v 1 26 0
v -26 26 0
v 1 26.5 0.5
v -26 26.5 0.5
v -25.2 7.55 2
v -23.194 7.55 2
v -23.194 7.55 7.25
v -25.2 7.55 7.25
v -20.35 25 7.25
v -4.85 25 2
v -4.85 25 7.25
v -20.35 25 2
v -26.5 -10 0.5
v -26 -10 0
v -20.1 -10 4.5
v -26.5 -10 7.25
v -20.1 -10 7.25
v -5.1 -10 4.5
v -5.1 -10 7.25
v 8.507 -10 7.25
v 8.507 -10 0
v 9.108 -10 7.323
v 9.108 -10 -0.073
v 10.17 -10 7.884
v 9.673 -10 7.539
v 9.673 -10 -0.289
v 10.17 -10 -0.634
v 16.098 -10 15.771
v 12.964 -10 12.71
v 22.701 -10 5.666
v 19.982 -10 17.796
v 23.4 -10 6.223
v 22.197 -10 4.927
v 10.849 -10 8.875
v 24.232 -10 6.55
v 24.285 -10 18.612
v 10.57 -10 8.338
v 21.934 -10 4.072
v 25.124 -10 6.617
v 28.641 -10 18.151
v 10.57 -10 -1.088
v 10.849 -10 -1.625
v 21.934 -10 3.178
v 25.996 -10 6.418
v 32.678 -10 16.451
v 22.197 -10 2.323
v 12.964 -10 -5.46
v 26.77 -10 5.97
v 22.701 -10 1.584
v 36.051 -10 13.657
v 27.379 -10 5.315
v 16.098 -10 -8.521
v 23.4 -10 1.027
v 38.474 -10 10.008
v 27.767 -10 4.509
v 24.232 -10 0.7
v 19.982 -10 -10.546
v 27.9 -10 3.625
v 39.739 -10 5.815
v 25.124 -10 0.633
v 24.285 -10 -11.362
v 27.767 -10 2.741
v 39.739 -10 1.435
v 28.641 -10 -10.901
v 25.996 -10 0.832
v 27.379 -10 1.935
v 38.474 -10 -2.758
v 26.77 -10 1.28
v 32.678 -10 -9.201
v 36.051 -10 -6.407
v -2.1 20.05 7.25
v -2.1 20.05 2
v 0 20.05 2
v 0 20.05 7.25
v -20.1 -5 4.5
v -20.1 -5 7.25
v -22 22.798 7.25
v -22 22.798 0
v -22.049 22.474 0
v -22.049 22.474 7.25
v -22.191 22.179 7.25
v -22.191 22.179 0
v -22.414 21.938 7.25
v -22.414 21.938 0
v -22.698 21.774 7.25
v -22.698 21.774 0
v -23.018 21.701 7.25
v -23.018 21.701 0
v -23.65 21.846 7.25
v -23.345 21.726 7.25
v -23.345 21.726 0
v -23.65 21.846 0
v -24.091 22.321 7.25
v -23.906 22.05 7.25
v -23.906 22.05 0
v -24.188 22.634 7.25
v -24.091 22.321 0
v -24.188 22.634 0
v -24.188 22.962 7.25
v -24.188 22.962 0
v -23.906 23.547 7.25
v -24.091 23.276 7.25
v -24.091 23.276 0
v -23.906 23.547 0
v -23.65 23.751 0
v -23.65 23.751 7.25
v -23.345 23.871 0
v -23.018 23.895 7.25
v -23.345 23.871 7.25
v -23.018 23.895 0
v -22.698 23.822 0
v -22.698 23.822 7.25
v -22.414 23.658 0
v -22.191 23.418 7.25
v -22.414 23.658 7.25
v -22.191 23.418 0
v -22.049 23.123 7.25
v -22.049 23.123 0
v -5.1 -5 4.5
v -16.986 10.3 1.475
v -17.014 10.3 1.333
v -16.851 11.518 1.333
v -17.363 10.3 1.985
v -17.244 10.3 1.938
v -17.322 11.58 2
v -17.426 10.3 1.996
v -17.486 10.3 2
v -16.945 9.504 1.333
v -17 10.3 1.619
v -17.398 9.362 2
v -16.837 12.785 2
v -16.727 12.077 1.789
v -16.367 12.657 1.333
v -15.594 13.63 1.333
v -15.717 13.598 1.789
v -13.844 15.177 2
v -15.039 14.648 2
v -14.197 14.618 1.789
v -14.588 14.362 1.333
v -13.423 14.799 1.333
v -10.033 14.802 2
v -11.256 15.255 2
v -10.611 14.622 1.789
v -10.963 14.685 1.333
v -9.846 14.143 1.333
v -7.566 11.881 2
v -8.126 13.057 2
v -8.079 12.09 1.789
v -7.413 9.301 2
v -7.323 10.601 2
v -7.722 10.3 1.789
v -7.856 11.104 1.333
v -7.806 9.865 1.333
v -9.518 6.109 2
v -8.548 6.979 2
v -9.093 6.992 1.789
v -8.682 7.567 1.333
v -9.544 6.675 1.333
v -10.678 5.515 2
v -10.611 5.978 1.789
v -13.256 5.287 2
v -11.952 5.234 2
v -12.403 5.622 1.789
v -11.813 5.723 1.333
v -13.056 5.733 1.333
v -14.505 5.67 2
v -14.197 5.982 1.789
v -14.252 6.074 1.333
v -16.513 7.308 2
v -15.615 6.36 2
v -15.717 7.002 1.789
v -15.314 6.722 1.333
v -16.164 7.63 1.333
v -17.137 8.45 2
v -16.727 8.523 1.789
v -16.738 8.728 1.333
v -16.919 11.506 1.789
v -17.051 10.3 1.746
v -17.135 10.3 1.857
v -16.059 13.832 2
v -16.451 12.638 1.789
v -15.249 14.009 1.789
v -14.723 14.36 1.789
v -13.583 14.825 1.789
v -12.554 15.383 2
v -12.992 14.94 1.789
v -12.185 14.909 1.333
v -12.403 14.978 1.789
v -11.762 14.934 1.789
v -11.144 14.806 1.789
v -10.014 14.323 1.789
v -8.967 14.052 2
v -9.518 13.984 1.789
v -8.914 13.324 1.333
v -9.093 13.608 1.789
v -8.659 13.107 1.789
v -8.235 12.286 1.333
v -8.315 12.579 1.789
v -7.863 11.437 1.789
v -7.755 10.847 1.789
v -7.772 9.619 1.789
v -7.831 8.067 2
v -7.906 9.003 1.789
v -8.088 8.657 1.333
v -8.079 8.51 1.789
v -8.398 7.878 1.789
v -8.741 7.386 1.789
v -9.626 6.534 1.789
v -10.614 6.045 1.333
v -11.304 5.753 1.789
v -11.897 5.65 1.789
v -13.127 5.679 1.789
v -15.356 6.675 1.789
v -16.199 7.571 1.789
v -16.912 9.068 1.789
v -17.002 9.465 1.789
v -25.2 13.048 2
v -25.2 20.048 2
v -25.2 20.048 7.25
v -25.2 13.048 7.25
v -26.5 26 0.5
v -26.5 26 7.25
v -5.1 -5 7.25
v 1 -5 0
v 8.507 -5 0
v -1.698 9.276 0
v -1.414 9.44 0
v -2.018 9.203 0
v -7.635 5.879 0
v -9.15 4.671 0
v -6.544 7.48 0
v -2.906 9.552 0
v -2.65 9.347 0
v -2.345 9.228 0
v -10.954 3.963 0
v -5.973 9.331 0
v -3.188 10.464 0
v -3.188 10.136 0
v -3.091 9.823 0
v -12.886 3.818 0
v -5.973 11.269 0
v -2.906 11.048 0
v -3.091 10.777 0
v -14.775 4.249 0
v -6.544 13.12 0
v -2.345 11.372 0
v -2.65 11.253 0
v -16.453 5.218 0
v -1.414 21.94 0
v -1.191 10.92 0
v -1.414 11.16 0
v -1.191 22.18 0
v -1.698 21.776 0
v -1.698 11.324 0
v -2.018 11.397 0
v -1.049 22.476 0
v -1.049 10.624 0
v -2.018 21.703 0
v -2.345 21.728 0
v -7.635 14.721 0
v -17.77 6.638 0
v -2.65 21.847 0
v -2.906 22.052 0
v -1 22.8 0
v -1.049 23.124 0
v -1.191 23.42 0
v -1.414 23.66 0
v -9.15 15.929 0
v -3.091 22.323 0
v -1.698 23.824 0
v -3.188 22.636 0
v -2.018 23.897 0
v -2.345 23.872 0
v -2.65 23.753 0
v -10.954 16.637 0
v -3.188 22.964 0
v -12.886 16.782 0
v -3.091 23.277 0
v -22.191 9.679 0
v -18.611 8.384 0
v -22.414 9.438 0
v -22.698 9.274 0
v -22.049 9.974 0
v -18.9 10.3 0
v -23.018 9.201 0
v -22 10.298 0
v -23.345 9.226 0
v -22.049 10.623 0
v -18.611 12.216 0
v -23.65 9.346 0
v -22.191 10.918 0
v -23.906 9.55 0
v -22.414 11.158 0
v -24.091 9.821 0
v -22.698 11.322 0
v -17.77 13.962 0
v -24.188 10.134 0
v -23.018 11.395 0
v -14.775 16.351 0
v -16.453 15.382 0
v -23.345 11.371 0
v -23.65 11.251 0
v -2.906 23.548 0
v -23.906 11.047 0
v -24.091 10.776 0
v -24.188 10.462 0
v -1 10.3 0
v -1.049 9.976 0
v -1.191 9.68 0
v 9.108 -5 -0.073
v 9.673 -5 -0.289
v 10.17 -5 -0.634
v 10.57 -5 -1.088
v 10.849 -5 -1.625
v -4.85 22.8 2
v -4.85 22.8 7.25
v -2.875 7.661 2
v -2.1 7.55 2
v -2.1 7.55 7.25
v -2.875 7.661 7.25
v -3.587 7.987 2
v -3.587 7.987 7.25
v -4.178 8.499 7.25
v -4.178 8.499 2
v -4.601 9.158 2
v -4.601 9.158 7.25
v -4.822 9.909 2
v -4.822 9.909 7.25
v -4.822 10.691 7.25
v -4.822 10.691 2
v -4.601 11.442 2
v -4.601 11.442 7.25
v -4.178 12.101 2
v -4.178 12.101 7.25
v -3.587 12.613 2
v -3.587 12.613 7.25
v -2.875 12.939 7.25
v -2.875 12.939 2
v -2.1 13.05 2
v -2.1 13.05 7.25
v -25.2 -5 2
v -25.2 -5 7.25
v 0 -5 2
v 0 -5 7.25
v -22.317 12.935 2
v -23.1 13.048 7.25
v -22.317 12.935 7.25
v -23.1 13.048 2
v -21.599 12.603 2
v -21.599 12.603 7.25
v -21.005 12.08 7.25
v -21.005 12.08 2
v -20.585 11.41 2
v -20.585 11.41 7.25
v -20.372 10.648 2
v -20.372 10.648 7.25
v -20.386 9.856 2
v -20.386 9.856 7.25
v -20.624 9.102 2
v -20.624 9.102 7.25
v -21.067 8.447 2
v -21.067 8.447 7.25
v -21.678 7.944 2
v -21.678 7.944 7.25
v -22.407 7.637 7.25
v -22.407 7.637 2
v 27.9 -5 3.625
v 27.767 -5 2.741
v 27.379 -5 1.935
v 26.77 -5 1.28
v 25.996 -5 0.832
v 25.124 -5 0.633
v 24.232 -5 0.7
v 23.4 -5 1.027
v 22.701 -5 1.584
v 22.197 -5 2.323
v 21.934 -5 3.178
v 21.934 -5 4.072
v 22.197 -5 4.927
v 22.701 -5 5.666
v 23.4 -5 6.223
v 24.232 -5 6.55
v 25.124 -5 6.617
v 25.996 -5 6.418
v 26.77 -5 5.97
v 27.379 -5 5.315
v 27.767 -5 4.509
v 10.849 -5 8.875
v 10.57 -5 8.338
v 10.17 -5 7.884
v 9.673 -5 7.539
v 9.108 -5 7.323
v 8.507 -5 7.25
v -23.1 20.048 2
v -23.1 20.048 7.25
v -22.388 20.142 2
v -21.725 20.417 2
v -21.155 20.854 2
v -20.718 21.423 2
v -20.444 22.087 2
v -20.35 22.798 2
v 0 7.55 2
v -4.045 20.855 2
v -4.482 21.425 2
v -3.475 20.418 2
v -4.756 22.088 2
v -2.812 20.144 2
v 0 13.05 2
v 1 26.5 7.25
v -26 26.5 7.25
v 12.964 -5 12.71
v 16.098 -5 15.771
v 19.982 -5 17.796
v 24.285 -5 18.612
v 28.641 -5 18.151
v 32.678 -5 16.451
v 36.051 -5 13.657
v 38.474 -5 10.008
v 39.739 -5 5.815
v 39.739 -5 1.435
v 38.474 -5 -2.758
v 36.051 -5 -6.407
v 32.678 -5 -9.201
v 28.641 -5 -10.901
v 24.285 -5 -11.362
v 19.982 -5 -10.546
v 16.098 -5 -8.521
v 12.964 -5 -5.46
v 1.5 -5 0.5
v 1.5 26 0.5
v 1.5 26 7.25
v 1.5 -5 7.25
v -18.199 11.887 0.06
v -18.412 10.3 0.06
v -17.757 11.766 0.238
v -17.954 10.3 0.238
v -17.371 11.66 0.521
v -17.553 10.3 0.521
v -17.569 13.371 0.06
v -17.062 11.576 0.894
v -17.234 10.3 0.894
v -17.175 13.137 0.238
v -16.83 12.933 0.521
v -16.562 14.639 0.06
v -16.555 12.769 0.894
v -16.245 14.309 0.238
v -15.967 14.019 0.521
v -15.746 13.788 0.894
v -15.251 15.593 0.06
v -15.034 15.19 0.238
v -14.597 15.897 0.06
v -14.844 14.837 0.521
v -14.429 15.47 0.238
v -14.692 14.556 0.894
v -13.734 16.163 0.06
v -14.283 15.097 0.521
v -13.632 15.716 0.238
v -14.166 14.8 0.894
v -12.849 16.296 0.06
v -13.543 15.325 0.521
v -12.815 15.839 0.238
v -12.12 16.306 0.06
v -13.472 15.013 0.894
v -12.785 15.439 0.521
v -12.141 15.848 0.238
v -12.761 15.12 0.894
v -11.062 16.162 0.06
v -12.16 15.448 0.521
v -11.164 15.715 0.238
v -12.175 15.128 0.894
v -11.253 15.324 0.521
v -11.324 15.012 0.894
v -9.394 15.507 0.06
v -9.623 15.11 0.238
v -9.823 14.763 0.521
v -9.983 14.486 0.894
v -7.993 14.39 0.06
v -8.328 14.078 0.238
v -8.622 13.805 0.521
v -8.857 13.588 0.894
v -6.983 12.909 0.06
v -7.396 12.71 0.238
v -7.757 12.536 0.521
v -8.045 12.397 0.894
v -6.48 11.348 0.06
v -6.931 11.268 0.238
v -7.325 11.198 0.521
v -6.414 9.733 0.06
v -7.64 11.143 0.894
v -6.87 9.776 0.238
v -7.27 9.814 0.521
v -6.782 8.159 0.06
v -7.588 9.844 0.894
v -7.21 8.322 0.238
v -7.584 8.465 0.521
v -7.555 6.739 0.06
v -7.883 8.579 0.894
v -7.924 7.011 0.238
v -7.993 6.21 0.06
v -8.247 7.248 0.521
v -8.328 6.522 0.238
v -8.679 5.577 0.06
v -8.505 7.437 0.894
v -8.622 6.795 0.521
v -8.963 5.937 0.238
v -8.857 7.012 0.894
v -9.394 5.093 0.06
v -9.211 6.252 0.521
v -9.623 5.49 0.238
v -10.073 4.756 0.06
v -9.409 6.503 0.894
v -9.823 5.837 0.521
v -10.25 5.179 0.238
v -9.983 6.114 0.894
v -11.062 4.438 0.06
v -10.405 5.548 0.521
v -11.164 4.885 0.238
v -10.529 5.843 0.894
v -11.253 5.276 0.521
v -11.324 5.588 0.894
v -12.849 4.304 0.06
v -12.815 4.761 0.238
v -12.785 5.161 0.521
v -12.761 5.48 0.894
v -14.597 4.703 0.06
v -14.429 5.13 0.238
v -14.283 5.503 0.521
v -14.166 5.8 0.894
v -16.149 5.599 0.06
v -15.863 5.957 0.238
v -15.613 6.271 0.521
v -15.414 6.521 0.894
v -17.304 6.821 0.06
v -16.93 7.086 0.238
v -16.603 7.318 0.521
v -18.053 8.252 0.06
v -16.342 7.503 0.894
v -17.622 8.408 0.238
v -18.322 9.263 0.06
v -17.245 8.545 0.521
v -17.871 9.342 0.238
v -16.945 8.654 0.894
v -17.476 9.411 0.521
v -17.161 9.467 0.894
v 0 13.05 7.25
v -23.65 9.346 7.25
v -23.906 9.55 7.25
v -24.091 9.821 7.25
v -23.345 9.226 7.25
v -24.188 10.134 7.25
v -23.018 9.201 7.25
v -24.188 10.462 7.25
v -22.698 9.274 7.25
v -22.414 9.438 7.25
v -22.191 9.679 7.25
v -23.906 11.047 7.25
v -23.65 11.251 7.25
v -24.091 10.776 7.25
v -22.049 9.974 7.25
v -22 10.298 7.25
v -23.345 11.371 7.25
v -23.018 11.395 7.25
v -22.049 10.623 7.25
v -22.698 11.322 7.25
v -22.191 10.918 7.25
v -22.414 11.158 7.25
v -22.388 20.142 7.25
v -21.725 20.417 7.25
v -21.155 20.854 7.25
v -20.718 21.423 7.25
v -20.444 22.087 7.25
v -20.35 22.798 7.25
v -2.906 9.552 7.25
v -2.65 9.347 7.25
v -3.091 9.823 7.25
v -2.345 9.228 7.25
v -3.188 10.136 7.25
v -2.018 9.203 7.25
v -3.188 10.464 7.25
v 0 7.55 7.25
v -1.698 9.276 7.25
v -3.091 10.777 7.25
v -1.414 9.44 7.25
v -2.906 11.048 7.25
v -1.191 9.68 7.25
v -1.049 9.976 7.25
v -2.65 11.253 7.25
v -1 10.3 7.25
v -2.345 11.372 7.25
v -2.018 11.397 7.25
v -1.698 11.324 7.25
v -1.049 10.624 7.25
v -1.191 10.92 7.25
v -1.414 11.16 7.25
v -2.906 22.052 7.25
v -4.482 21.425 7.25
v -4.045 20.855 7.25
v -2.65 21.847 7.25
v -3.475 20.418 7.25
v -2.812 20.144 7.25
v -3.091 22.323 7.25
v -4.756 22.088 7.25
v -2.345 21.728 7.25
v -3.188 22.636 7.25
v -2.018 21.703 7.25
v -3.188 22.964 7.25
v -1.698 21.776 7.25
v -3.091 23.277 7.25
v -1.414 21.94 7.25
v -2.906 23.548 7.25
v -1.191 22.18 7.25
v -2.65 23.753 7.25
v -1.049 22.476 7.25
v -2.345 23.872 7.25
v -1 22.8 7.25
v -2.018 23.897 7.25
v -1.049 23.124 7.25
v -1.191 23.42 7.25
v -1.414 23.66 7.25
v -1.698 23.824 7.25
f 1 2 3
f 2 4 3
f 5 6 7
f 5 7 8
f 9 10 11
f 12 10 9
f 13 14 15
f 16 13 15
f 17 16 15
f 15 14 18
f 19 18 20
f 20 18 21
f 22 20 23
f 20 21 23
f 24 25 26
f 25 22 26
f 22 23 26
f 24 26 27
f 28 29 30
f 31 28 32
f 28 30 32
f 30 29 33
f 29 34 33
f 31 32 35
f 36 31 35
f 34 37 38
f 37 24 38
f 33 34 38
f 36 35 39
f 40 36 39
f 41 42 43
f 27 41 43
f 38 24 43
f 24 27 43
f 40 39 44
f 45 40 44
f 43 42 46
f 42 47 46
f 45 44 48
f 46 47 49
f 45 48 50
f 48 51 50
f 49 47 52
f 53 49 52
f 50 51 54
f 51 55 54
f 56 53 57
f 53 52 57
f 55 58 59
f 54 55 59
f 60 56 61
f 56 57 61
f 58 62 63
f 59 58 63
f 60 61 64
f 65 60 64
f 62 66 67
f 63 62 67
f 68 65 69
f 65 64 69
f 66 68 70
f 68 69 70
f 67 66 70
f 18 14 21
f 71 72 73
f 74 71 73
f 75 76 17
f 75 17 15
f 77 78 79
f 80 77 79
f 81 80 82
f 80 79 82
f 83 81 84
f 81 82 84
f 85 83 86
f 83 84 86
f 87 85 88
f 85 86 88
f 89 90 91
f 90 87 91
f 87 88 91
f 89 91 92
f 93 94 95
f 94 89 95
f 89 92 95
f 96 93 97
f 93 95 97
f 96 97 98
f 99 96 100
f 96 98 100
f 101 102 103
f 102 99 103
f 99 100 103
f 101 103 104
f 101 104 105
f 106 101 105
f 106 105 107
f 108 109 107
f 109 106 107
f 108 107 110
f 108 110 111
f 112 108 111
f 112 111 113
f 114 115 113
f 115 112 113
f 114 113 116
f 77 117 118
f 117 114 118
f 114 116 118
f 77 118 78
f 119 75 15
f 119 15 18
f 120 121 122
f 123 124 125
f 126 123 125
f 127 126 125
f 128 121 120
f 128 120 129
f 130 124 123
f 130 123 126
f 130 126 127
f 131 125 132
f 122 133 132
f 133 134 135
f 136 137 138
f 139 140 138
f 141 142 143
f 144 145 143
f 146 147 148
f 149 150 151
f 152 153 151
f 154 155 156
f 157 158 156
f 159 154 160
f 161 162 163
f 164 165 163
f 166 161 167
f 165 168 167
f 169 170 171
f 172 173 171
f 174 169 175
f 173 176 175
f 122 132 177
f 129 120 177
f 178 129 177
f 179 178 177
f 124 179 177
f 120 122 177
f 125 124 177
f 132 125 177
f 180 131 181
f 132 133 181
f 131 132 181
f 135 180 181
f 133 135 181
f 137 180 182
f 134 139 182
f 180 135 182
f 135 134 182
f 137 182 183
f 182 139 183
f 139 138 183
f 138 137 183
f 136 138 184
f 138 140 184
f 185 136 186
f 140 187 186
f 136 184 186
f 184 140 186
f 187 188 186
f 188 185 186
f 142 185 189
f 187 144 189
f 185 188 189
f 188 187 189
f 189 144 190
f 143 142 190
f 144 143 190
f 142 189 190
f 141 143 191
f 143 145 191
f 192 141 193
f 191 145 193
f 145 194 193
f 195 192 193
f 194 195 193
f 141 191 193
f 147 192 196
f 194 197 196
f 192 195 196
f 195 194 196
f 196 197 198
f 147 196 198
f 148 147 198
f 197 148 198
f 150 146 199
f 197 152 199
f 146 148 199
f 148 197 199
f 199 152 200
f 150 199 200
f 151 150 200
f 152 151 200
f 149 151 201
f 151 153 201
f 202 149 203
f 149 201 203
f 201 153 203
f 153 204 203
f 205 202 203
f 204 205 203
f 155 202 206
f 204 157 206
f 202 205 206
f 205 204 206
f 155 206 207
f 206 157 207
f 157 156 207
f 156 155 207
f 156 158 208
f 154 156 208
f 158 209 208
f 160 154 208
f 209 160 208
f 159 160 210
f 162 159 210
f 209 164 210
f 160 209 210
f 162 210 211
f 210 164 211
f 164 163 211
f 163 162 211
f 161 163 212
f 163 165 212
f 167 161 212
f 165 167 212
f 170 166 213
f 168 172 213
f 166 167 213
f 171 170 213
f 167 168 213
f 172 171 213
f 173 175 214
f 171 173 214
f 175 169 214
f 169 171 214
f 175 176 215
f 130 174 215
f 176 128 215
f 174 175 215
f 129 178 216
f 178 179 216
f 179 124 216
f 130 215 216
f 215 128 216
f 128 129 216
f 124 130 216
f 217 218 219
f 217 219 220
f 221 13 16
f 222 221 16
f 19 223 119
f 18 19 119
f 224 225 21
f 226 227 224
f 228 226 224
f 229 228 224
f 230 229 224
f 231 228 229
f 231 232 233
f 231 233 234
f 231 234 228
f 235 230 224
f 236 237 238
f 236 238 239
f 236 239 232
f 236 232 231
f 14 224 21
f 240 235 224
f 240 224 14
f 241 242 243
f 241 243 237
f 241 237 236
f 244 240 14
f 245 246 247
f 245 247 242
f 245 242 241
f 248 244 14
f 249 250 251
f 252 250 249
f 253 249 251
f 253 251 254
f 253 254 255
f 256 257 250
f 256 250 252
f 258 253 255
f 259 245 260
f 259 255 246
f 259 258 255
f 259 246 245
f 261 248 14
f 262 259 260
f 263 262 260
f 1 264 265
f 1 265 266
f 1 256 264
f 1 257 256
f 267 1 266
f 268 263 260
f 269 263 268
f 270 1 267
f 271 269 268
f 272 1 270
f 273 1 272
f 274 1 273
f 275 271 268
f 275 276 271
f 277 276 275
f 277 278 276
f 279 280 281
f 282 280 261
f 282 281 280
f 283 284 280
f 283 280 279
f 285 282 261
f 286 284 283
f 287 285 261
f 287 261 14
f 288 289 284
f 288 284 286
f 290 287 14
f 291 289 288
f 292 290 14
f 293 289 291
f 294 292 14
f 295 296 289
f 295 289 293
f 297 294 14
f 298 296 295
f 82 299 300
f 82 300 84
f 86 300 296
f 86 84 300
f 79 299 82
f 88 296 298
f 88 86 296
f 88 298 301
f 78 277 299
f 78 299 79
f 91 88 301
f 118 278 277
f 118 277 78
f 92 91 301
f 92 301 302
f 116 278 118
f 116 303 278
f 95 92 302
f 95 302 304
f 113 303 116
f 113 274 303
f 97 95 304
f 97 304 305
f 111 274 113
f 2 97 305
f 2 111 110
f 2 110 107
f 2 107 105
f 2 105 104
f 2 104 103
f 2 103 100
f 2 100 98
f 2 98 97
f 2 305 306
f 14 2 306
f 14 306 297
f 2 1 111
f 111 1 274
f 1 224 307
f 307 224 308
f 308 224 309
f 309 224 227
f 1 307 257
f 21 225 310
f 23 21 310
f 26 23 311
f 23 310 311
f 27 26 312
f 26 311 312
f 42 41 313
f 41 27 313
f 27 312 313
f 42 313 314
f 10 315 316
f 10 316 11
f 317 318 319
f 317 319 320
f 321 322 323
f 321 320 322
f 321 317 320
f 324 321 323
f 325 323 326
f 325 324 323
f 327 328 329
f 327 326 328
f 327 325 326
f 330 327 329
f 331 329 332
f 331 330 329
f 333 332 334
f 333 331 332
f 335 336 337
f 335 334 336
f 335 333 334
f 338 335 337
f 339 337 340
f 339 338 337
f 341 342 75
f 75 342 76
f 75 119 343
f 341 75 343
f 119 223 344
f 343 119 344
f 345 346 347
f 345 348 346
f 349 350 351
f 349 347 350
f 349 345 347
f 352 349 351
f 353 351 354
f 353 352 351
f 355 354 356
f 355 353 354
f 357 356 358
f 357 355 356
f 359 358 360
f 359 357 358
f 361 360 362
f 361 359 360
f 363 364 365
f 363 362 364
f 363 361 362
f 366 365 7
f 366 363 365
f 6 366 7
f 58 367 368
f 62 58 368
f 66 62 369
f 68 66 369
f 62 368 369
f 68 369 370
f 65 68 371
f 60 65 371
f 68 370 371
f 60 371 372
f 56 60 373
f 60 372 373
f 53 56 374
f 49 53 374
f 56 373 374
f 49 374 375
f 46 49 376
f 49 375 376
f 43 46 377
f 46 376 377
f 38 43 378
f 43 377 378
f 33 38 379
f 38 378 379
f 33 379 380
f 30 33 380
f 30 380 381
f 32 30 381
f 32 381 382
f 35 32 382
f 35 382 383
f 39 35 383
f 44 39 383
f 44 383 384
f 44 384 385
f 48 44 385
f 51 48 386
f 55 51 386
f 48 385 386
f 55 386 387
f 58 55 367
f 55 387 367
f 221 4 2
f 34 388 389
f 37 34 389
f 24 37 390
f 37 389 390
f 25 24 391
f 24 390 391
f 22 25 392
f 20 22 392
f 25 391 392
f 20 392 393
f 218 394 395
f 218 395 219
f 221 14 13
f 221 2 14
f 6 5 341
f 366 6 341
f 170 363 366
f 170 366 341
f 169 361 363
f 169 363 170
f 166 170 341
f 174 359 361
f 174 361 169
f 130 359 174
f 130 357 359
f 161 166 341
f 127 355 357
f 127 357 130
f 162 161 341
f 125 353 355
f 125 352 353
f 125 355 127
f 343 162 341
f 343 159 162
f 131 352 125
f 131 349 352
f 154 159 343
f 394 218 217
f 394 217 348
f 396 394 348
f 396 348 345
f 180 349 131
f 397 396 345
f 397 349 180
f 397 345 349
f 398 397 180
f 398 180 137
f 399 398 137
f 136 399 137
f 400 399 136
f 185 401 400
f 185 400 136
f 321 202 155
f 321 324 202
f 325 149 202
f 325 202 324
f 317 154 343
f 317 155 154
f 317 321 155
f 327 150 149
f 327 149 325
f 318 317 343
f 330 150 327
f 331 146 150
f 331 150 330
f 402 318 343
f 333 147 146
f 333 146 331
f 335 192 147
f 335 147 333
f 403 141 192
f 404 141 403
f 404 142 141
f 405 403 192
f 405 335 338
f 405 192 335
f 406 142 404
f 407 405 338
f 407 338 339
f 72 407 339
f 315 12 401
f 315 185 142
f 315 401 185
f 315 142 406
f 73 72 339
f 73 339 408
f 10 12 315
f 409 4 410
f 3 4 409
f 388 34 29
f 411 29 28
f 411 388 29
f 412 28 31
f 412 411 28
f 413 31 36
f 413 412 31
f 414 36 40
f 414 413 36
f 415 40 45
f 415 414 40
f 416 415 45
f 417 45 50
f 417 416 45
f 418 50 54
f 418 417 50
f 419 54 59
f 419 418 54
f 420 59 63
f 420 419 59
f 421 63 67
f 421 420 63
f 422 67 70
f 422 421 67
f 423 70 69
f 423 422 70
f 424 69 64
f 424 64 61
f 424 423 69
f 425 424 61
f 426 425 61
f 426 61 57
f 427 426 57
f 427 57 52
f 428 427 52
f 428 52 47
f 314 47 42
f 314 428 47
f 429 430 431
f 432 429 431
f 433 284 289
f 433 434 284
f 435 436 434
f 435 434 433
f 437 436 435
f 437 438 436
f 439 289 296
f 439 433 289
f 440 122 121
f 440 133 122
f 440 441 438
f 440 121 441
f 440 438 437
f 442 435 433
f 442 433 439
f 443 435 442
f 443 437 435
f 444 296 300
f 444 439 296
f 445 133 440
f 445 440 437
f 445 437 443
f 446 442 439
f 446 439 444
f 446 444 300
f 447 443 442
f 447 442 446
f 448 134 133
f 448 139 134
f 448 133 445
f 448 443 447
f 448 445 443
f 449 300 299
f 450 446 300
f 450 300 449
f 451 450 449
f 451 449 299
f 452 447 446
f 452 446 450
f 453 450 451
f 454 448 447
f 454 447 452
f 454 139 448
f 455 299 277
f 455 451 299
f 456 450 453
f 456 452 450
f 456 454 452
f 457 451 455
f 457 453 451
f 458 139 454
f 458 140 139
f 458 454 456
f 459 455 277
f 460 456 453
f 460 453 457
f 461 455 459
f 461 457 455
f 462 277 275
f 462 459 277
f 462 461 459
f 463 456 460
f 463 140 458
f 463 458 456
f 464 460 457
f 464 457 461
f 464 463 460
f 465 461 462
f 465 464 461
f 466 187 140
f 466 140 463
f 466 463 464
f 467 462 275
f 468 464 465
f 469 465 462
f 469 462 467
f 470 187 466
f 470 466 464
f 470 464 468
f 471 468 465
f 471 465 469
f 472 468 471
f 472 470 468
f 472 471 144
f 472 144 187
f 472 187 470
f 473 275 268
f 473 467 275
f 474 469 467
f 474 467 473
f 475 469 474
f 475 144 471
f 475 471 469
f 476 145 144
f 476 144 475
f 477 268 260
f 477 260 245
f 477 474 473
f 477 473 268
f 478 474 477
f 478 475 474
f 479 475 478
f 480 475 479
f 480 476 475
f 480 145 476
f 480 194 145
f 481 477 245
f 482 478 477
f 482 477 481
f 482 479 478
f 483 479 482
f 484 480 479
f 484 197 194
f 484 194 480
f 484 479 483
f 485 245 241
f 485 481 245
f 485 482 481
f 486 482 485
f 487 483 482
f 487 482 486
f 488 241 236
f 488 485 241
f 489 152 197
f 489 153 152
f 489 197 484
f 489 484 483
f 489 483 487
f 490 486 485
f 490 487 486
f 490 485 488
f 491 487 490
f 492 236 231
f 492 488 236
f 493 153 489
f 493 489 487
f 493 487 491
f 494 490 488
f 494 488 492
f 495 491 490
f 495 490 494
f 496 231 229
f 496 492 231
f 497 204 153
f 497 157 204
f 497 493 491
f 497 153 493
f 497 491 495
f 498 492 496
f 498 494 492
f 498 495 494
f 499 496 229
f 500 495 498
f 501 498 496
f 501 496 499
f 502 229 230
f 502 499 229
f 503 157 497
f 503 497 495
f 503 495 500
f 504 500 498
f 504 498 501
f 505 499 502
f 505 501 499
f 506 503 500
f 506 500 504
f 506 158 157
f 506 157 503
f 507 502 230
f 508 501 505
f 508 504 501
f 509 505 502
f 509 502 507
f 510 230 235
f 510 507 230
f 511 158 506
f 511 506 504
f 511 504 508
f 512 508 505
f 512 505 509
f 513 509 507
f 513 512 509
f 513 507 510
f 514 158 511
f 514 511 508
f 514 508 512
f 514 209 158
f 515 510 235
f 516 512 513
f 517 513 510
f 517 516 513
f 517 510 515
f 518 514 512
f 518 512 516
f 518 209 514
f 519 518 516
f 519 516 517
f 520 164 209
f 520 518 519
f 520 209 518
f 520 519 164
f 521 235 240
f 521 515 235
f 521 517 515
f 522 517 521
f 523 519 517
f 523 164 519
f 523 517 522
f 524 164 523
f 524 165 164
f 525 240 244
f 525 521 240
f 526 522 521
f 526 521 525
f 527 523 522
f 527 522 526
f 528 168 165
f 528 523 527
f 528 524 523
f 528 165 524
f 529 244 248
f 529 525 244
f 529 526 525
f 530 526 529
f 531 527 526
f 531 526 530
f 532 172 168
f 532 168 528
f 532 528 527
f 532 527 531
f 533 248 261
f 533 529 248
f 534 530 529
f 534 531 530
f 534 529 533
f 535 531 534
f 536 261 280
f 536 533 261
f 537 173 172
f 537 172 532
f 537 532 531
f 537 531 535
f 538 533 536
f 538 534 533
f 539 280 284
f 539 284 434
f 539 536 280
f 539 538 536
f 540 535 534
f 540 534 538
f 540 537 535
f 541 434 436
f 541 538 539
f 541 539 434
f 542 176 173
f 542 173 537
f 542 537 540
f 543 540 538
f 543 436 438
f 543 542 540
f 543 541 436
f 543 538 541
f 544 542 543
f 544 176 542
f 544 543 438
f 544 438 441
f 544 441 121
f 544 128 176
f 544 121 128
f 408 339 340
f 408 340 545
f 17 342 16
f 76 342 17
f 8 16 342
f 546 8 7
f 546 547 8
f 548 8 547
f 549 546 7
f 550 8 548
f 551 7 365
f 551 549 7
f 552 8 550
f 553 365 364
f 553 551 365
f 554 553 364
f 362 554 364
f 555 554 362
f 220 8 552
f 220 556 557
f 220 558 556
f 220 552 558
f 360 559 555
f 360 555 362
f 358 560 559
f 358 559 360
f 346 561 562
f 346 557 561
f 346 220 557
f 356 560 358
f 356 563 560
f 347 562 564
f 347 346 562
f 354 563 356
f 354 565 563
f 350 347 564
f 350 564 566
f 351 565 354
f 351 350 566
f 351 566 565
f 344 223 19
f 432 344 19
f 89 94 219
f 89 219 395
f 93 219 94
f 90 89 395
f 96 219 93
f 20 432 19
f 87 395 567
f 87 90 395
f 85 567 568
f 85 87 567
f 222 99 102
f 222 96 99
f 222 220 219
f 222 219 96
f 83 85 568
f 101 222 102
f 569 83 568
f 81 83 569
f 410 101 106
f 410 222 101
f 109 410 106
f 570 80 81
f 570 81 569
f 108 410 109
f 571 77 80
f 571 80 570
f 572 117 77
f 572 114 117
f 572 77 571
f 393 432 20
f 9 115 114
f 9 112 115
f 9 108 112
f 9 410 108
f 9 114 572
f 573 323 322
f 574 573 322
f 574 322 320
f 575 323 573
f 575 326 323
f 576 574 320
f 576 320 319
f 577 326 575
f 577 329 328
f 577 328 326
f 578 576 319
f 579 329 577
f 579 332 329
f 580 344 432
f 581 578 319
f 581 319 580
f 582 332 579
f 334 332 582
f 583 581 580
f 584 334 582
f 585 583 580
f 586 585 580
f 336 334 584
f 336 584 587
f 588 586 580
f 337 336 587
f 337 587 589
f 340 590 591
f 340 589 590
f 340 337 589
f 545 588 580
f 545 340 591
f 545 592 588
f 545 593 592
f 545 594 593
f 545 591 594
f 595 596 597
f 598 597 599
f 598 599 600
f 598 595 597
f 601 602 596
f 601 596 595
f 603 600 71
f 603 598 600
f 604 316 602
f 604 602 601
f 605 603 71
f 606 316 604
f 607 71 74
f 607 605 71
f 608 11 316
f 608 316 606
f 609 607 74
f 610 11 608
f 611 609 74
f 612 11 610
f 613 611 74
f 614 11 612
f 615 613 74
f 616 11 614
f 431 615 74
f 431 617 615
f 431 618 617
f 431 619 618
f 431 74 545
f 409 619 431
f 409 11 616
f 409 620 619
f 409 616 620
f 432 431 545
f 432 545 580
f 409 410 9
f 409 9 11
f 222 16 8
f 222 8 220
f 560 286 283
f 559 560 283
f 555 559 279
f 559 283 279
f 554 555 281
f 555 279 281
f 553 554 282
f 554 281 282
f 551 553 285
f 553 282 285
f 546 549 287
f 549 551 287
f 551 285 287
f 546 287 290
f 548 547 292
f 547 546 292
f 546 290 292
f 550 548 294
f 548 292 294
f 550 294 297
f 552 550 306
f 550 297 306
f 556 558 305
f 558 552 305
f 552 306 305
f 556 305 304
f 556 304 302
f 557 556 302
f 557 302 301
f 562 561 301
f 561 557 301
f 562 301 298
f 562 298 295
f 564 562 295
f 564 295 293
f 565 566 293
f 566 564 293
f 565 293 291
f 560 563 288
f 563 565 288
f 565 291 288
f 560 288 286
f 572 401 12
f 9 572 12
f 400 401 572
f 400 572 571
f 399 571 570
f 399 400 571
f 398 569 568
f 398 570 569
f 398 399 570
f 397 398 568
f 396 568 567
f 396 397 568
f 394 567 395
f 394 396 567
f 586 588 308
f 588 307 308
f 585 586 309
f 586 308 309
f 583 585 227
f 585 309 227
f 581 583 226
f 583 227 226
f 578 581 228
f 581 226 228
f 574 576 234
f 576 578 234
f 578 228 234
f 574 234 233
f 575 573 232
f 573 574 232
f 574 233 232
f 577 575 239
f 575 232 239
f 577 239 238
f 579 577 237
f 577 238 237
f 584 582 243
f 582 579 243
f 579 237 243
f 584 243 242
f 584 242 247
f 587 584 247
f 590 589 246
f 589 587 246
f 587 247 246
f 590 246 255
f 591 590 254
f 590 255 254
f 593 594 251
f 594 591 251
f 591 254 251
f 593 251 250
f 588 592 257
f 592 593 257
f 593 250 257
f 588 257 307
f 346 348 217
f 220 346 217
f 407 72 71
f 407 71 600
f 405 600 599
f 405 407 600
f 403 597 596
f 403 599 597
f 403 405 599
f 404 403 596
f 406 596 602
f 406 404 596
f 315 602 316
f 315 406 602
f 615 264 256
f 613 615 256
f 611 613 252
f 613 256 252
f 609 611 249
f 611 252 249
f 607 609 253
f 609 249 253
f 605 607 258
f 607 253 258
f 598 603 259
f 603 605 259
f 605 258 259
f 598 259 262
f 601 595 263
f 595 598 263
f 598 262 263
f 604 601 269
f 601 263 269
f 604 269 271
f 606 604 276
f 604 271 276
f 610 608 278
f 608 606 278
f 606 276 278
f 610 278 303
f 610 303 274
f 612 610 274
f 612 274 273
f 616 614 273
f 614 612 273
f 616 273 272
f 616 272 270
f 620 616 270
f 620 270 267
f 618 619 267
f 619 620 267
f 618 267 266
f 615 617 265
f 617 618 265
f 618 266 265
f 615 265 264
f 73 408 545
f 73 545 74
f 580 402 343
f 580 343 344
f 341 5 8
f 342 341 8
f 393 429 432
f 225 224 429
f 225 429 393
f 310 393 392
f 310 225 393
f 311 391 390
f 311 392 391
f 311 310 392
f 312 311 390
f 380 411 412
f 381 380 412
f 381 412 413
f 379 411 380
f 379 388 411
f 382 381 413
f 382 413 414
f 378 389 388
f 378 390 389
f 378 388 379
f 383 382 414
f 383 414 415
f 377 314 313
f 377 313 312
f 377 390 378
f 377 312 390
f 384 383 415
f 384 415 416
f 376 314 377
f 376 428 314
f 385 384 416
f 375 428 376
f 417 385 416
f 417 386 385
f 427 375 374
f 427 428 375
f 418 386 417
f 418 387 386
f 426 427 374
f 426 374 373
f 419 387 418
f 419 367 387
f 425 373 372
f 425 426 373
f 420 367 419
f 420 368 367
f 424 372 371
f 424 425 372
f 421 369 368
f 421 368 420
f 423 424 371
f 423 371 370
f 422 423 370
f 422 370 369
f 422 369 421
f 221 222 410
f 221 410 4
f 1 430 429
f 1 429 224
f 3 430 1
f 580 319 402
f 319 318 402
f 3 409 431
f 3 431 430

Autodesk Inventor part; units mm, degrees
ref_plane "YZ Plane" through (0, 0, 0) normal (1, 0, 0) x (0, 1, 0)
ref_plane "XZ Plane" through (0, 0, 0) normal (0, 1, 0) x (-1, 0, 0)
ref_plane "XY Plane" through (0, 0, 0) normal (0, 0, 1) x (1, 0, 0)
sketch "Sketch1" plane through (0, 0, 0) normal (0, 0, 1) x (1, 0, 0)
  line L0 (0, 0) -> (-25, 0)
  line L1 (-25, 25) -> (0, 25)
  line L2 (0, 25) -> (0, 0)
  circle A0 centre (-23.1, 22.7984) radius 1.1
  circle A1 centre (-2.1, 22.8) radius 1.1
  circle A2 centre (-23.1, 10.2984) radius 1.1
  circle A3 centre (-2.1, 10.3) radius 1.1
  line L3 (-25, 0) -> (-25.2, 0)
  line L4 (-25.2, 0) -> (-25.2, 25)
  line L5 (-25.2, 25) -> (-25, 25)
  dimension "d2" = 2.2
  dimension "d5" = 2.2
  dimension "d7" = 12.5
  dimension "d8" = 2.2
  dimension "d9" = 2.2
  dimension "d14" = 12.5
  dimension "d31" = 2.1
  dimension "d46" = 0.2
  dimension "d47" = 2.1
  dimension "d48" = 2.1
extrude "Base" add sketch "Sketch1" along normal blind 2
sketch "Sketch2" plane through (0, 0, 2) normal (0, 0, 1) x (1, 0, 0)
  line L0 (-26.5, 0) -> (-26.5, 26.5)
  line L1 (-26.5, 26.5) -> (1.5, 26.5)
  line L2 (1.5, 26.5) -> (1.5, 0)
  line L3 (1.5, 0) -> (0, 0)
  line L4 (0, 25) -> (-25.2, 25) projected
  line L5 (0, 0) -> (0, 25) projected
  line L6 (-25.2, 25) -> (-25.2, 0) projected
  line L7 (-25.2, 0) -> (-26.5, 0)
  point P0 (-25, 25)
  point P1 (-25, 0)
  dimension "d16" = 26.5
  dimension "d17" = 28
extrude "Walls" add sketch "Sketch2" along normal blind 5.25 and the other way blind 2
sketch "Sketch3" plane through (0, 0, 2) normal (0, 0, 1) x (1, 0, 0)
  circle A0 centre (-23.1, 10.2984) radius 1.1 projected
  circle A1 centre (-23.1, 10.2984) radius 1.6
  circle A2 centre (-2.1, 10.3) radius 1.1 projected
  circle A3 centre (-2.1, 10.3) radius 1.6
  circle A4 centre (-23.1, 22.7984) radius 1.1 projected
  circle A5 centre (-23.1, 22.7984) radius 1.6
  circle A6 centre (-2.1, 22.8) radius 1.1 projected
  circle A7 centre (-2.1, 22.8) radius 1.6
  point P0 (0, 0)
  dimension "d22" = 3.2
  dimension "d23" = 3.2
  dimension "d24" = 3.2
  dimension "d25" = 3.2
extrude "Spacers" add sketch "Sketch3" along normal up to surface (5.25 mm away)
sketch "Sketch4" plane through (0, 0, 2) normal (0, 0, 1) x (1, 0, 0)
  circle A0 centre (-23.1, 10.2984) radius 1.1 projected
  arc A1 (-23.1938, 7.55) -> (-23.1, 13.0484) centre (-23.1, 10.2984) ccw
  circle A2 centre (-2.1, 10.3) radius 1.1 projected
  arc A3 (-2.1, 13.05) -> (-2.1, 7.55) centre (-2.1, 10.3) ccw
  circle A4 centre (-23.1, 22.7984) radius 1.1 projected
  circle A5 centre (-2.1, 22.8) radius 1.1 projected
  line L0 (-4.85, 22.8) -> (-4.85, 25)
  line L1 (-25.2, 25) -> (0, 25) projected
  line L2 (-2.1, 20.05) -> (0, 20.05)
  line L3 (0, 25) -> (0, 0) projected
  line L4 (-2.1, 13.05) -> (0, 13.05)
  line L5 (-2.1, 7.55) -> (0, 7.55)
  line L6 (-23.1, 13.0484) -> (-25.2, 13.0484)
  line L7 (-23.1938, 7.55) -> (-25, 7.55)
  arc A6 (-4.85, 22.8) -> (-2.1, 20.05) centre (-2.1, 22.8) ccw
  line L8 (-25, 7.55) -> (-25.2, 7.55)
  line L9 (-25.2, 13.0484) -> (-25.2, 13.0484)
  line L10 (-25.2, 25) -> (-25.2, 0) projected
  line L11 (-25.2, 20.0484) -> (-25.2, 20.0484)
  line L12 (-20.35, 22.7984) -> (-20.35, 25.6874)
  line L13 (-23.1, 20.0484) -> (-25.85, 20.0484)
  arc A7 (-23.1, 20.0484) -> (-20.35, 22.7984) centre (-23.1, 22.7984) ccw
  point P0 (-25, 25)
  point P1 (-20.35, 25)
  point P2 (-25.2, 20.0484)
  dimension "d33" = 5.5
  dimension "d34" = 5.5
extrude "Spacer blocks" add sketch "Sketch4" along normal up to surface (5.25 mm away)
sketch "Sketch5" plane through (0, 0, 0) normal (0, 0, -1) x (-1, 0, 0)
  line L0 (-1.5, 26.5) -> (-1.5, 0) projected
  circle A0 centre (12.4, 10.3) radius 4.5
  point P0 (0, 0)
  dimension "d39" = 13.9
  dimension "d40" = 9
extrude "Camera Hole" cut sketch "Sketch5" against normal through all
fillet "Outside Fillet - 2mm" radius 2 1 edges at (-7.9, 10.3, 0)
fillet "Inside Fillet - 1mm" radius 0.5 2 edges at (-7.9, 10.3, 1.9999) (-7.9, 10.3, 2)
chamfer "Chamfer1" distance 0.5 angle 45 5 edges at (1.5, 13.25, 0) (1.5, 26.5, 3.625) (-12.5, 26.5, 0) (-26.5, 26.5, 3.625) (-26.5, 13.25, 0)
sketch "Sketch6" plane through (-25.2, 0, 2) normal (0, -1, 0) x (1, 0, 0)
  line L0 (-0.8, -2) -> (-1.3, -1.5) projected
  line L1 (26.2, -2) -> (-0.8, -2) projected
  line L2 (26.7, -1.5) -> (26.2, -2) projected
  line L3 (26.7, -1.5) -> (26.7, 5.25) projected
  line L4 (25.2, 5.25) -> (26.7, 5.25) projected
  line L5 (25.2, 0) -> (25.2, 5.25) projected
  line L6 (0, 0) -> (25.2, 0) projected
  line L7 (0, 0) -> (0, 5.25) projected
  line L8 (-1.3, 5.25) -> (0, 5.25) projected
  line L9 (-1.3, -1.5) -> (-1.3, 5.25) projected
  point P0 (25.2, -2)
extrude "Bottom Extension" add sketch "Sketch6" along normal blind 5
sketch "Sketch7" plane through (-25.2, -5, 2) normal (0, -1, 0) x (1, 0, 0)
  line L0 (26.7, 5.25) -> (25.2, 5.25) projected
  line L1 (26.7, 5.25) -> (20.1, 5.25)
  line L2 (20.1, 5.25) -> (20.1, -2)
  line L3 (20.1, -2) -> (50.1, -2)
  line L4 (50.1, -2) -> (50.1, 5.25)
  line L5 (50.1, 5.25) -> (26.7, 5.25)
  line L6 (26.7, 5.25) -> (25.2, 5.25) construction
  line L7 (25.2, 5.25) -> (25.2, 0) construction
  line L8 (25.2, 0) -> (0, 0) construction
  line L9 (0, 0) -> (0, 5.25) construction
  line L10 (0, 5.25) -> (-1.3, 5.25) construction
  line L11 (-1.3, 5.25) -> (-1.3, -1.5) construction
  line L12 (-1.3, -1.5) -> (-0.8, -2) construction
  line L13 (-0.8, -2) -> (26.2, -2) construction
  line L14 (26.2, -2) -> (26.7, -1.5) construction
  line L15 (26.7, -1.5) -> (26.7, 5.25) construction
  line L16 (20.1, -2) -> (-0.8, -2)
  line L17 (-1.3, -1.5) -> (-0.8, -2)
  line L18 (-1.3, -1.5) -> (-1.3, 5.25)
  line L19 (-1.3, 5.25) -> (0, 5.25)
  line L20 (0, 5.25) -> (5.1, 5.25)
  line L21 (5.1, 5.25) -> (5.1, 0)
  line L22 (5.1, 0) -> (20.1, 0)
  line L23 (5.1, 0) -> (5.1, 2.5)
  line L24 (5.1, 2.5) -> (20.1, 2.5)
  point P0 (25.2, -2)
  dimension "d54" = 6.6
  dimension "d55" = 30
  dimension "d58" = 5.1
  dimension "d59" = 2.5
extrude "Mounting Arm" add sketch "Sketch7" along normal blind 5
sketch "Sketch8" plane through (-25.2, -5, 2) normal (0, 1, 0) x (1, 0, 0)
  line L0 (50.1, 2) -> (50.1, -5.25) projected
  circle A0 centre (50.1, -1.625) radius 15
  point P0 (25.2, 2)
  dimension "d60" = 30
extrude "Mounting Disk" add sketch "Sketch8" against normal up to surface (5 mm away)
fillet "Fillet4" radius 2.5 2 edges at (10.3446, -7.5, 0) (10.3446, -7.5, 7.25)
sketch "Sketch9" plane through (-25.2, -5, 2) normal (0, 1, 0) x (1, 0, 0)
  arc A0 (36.0488, -6.875) -> (36.0488, 3.625) centre (50.1, -1.625) ccw projected
  circle A1 centre (50.1, -1.625) radius 3
  point P0 (25.2, 2)
  dimension "d64" = 6
extrude "Center Hole" cut sketch "Sketch9" against normal through all
properties part number "Top L"
